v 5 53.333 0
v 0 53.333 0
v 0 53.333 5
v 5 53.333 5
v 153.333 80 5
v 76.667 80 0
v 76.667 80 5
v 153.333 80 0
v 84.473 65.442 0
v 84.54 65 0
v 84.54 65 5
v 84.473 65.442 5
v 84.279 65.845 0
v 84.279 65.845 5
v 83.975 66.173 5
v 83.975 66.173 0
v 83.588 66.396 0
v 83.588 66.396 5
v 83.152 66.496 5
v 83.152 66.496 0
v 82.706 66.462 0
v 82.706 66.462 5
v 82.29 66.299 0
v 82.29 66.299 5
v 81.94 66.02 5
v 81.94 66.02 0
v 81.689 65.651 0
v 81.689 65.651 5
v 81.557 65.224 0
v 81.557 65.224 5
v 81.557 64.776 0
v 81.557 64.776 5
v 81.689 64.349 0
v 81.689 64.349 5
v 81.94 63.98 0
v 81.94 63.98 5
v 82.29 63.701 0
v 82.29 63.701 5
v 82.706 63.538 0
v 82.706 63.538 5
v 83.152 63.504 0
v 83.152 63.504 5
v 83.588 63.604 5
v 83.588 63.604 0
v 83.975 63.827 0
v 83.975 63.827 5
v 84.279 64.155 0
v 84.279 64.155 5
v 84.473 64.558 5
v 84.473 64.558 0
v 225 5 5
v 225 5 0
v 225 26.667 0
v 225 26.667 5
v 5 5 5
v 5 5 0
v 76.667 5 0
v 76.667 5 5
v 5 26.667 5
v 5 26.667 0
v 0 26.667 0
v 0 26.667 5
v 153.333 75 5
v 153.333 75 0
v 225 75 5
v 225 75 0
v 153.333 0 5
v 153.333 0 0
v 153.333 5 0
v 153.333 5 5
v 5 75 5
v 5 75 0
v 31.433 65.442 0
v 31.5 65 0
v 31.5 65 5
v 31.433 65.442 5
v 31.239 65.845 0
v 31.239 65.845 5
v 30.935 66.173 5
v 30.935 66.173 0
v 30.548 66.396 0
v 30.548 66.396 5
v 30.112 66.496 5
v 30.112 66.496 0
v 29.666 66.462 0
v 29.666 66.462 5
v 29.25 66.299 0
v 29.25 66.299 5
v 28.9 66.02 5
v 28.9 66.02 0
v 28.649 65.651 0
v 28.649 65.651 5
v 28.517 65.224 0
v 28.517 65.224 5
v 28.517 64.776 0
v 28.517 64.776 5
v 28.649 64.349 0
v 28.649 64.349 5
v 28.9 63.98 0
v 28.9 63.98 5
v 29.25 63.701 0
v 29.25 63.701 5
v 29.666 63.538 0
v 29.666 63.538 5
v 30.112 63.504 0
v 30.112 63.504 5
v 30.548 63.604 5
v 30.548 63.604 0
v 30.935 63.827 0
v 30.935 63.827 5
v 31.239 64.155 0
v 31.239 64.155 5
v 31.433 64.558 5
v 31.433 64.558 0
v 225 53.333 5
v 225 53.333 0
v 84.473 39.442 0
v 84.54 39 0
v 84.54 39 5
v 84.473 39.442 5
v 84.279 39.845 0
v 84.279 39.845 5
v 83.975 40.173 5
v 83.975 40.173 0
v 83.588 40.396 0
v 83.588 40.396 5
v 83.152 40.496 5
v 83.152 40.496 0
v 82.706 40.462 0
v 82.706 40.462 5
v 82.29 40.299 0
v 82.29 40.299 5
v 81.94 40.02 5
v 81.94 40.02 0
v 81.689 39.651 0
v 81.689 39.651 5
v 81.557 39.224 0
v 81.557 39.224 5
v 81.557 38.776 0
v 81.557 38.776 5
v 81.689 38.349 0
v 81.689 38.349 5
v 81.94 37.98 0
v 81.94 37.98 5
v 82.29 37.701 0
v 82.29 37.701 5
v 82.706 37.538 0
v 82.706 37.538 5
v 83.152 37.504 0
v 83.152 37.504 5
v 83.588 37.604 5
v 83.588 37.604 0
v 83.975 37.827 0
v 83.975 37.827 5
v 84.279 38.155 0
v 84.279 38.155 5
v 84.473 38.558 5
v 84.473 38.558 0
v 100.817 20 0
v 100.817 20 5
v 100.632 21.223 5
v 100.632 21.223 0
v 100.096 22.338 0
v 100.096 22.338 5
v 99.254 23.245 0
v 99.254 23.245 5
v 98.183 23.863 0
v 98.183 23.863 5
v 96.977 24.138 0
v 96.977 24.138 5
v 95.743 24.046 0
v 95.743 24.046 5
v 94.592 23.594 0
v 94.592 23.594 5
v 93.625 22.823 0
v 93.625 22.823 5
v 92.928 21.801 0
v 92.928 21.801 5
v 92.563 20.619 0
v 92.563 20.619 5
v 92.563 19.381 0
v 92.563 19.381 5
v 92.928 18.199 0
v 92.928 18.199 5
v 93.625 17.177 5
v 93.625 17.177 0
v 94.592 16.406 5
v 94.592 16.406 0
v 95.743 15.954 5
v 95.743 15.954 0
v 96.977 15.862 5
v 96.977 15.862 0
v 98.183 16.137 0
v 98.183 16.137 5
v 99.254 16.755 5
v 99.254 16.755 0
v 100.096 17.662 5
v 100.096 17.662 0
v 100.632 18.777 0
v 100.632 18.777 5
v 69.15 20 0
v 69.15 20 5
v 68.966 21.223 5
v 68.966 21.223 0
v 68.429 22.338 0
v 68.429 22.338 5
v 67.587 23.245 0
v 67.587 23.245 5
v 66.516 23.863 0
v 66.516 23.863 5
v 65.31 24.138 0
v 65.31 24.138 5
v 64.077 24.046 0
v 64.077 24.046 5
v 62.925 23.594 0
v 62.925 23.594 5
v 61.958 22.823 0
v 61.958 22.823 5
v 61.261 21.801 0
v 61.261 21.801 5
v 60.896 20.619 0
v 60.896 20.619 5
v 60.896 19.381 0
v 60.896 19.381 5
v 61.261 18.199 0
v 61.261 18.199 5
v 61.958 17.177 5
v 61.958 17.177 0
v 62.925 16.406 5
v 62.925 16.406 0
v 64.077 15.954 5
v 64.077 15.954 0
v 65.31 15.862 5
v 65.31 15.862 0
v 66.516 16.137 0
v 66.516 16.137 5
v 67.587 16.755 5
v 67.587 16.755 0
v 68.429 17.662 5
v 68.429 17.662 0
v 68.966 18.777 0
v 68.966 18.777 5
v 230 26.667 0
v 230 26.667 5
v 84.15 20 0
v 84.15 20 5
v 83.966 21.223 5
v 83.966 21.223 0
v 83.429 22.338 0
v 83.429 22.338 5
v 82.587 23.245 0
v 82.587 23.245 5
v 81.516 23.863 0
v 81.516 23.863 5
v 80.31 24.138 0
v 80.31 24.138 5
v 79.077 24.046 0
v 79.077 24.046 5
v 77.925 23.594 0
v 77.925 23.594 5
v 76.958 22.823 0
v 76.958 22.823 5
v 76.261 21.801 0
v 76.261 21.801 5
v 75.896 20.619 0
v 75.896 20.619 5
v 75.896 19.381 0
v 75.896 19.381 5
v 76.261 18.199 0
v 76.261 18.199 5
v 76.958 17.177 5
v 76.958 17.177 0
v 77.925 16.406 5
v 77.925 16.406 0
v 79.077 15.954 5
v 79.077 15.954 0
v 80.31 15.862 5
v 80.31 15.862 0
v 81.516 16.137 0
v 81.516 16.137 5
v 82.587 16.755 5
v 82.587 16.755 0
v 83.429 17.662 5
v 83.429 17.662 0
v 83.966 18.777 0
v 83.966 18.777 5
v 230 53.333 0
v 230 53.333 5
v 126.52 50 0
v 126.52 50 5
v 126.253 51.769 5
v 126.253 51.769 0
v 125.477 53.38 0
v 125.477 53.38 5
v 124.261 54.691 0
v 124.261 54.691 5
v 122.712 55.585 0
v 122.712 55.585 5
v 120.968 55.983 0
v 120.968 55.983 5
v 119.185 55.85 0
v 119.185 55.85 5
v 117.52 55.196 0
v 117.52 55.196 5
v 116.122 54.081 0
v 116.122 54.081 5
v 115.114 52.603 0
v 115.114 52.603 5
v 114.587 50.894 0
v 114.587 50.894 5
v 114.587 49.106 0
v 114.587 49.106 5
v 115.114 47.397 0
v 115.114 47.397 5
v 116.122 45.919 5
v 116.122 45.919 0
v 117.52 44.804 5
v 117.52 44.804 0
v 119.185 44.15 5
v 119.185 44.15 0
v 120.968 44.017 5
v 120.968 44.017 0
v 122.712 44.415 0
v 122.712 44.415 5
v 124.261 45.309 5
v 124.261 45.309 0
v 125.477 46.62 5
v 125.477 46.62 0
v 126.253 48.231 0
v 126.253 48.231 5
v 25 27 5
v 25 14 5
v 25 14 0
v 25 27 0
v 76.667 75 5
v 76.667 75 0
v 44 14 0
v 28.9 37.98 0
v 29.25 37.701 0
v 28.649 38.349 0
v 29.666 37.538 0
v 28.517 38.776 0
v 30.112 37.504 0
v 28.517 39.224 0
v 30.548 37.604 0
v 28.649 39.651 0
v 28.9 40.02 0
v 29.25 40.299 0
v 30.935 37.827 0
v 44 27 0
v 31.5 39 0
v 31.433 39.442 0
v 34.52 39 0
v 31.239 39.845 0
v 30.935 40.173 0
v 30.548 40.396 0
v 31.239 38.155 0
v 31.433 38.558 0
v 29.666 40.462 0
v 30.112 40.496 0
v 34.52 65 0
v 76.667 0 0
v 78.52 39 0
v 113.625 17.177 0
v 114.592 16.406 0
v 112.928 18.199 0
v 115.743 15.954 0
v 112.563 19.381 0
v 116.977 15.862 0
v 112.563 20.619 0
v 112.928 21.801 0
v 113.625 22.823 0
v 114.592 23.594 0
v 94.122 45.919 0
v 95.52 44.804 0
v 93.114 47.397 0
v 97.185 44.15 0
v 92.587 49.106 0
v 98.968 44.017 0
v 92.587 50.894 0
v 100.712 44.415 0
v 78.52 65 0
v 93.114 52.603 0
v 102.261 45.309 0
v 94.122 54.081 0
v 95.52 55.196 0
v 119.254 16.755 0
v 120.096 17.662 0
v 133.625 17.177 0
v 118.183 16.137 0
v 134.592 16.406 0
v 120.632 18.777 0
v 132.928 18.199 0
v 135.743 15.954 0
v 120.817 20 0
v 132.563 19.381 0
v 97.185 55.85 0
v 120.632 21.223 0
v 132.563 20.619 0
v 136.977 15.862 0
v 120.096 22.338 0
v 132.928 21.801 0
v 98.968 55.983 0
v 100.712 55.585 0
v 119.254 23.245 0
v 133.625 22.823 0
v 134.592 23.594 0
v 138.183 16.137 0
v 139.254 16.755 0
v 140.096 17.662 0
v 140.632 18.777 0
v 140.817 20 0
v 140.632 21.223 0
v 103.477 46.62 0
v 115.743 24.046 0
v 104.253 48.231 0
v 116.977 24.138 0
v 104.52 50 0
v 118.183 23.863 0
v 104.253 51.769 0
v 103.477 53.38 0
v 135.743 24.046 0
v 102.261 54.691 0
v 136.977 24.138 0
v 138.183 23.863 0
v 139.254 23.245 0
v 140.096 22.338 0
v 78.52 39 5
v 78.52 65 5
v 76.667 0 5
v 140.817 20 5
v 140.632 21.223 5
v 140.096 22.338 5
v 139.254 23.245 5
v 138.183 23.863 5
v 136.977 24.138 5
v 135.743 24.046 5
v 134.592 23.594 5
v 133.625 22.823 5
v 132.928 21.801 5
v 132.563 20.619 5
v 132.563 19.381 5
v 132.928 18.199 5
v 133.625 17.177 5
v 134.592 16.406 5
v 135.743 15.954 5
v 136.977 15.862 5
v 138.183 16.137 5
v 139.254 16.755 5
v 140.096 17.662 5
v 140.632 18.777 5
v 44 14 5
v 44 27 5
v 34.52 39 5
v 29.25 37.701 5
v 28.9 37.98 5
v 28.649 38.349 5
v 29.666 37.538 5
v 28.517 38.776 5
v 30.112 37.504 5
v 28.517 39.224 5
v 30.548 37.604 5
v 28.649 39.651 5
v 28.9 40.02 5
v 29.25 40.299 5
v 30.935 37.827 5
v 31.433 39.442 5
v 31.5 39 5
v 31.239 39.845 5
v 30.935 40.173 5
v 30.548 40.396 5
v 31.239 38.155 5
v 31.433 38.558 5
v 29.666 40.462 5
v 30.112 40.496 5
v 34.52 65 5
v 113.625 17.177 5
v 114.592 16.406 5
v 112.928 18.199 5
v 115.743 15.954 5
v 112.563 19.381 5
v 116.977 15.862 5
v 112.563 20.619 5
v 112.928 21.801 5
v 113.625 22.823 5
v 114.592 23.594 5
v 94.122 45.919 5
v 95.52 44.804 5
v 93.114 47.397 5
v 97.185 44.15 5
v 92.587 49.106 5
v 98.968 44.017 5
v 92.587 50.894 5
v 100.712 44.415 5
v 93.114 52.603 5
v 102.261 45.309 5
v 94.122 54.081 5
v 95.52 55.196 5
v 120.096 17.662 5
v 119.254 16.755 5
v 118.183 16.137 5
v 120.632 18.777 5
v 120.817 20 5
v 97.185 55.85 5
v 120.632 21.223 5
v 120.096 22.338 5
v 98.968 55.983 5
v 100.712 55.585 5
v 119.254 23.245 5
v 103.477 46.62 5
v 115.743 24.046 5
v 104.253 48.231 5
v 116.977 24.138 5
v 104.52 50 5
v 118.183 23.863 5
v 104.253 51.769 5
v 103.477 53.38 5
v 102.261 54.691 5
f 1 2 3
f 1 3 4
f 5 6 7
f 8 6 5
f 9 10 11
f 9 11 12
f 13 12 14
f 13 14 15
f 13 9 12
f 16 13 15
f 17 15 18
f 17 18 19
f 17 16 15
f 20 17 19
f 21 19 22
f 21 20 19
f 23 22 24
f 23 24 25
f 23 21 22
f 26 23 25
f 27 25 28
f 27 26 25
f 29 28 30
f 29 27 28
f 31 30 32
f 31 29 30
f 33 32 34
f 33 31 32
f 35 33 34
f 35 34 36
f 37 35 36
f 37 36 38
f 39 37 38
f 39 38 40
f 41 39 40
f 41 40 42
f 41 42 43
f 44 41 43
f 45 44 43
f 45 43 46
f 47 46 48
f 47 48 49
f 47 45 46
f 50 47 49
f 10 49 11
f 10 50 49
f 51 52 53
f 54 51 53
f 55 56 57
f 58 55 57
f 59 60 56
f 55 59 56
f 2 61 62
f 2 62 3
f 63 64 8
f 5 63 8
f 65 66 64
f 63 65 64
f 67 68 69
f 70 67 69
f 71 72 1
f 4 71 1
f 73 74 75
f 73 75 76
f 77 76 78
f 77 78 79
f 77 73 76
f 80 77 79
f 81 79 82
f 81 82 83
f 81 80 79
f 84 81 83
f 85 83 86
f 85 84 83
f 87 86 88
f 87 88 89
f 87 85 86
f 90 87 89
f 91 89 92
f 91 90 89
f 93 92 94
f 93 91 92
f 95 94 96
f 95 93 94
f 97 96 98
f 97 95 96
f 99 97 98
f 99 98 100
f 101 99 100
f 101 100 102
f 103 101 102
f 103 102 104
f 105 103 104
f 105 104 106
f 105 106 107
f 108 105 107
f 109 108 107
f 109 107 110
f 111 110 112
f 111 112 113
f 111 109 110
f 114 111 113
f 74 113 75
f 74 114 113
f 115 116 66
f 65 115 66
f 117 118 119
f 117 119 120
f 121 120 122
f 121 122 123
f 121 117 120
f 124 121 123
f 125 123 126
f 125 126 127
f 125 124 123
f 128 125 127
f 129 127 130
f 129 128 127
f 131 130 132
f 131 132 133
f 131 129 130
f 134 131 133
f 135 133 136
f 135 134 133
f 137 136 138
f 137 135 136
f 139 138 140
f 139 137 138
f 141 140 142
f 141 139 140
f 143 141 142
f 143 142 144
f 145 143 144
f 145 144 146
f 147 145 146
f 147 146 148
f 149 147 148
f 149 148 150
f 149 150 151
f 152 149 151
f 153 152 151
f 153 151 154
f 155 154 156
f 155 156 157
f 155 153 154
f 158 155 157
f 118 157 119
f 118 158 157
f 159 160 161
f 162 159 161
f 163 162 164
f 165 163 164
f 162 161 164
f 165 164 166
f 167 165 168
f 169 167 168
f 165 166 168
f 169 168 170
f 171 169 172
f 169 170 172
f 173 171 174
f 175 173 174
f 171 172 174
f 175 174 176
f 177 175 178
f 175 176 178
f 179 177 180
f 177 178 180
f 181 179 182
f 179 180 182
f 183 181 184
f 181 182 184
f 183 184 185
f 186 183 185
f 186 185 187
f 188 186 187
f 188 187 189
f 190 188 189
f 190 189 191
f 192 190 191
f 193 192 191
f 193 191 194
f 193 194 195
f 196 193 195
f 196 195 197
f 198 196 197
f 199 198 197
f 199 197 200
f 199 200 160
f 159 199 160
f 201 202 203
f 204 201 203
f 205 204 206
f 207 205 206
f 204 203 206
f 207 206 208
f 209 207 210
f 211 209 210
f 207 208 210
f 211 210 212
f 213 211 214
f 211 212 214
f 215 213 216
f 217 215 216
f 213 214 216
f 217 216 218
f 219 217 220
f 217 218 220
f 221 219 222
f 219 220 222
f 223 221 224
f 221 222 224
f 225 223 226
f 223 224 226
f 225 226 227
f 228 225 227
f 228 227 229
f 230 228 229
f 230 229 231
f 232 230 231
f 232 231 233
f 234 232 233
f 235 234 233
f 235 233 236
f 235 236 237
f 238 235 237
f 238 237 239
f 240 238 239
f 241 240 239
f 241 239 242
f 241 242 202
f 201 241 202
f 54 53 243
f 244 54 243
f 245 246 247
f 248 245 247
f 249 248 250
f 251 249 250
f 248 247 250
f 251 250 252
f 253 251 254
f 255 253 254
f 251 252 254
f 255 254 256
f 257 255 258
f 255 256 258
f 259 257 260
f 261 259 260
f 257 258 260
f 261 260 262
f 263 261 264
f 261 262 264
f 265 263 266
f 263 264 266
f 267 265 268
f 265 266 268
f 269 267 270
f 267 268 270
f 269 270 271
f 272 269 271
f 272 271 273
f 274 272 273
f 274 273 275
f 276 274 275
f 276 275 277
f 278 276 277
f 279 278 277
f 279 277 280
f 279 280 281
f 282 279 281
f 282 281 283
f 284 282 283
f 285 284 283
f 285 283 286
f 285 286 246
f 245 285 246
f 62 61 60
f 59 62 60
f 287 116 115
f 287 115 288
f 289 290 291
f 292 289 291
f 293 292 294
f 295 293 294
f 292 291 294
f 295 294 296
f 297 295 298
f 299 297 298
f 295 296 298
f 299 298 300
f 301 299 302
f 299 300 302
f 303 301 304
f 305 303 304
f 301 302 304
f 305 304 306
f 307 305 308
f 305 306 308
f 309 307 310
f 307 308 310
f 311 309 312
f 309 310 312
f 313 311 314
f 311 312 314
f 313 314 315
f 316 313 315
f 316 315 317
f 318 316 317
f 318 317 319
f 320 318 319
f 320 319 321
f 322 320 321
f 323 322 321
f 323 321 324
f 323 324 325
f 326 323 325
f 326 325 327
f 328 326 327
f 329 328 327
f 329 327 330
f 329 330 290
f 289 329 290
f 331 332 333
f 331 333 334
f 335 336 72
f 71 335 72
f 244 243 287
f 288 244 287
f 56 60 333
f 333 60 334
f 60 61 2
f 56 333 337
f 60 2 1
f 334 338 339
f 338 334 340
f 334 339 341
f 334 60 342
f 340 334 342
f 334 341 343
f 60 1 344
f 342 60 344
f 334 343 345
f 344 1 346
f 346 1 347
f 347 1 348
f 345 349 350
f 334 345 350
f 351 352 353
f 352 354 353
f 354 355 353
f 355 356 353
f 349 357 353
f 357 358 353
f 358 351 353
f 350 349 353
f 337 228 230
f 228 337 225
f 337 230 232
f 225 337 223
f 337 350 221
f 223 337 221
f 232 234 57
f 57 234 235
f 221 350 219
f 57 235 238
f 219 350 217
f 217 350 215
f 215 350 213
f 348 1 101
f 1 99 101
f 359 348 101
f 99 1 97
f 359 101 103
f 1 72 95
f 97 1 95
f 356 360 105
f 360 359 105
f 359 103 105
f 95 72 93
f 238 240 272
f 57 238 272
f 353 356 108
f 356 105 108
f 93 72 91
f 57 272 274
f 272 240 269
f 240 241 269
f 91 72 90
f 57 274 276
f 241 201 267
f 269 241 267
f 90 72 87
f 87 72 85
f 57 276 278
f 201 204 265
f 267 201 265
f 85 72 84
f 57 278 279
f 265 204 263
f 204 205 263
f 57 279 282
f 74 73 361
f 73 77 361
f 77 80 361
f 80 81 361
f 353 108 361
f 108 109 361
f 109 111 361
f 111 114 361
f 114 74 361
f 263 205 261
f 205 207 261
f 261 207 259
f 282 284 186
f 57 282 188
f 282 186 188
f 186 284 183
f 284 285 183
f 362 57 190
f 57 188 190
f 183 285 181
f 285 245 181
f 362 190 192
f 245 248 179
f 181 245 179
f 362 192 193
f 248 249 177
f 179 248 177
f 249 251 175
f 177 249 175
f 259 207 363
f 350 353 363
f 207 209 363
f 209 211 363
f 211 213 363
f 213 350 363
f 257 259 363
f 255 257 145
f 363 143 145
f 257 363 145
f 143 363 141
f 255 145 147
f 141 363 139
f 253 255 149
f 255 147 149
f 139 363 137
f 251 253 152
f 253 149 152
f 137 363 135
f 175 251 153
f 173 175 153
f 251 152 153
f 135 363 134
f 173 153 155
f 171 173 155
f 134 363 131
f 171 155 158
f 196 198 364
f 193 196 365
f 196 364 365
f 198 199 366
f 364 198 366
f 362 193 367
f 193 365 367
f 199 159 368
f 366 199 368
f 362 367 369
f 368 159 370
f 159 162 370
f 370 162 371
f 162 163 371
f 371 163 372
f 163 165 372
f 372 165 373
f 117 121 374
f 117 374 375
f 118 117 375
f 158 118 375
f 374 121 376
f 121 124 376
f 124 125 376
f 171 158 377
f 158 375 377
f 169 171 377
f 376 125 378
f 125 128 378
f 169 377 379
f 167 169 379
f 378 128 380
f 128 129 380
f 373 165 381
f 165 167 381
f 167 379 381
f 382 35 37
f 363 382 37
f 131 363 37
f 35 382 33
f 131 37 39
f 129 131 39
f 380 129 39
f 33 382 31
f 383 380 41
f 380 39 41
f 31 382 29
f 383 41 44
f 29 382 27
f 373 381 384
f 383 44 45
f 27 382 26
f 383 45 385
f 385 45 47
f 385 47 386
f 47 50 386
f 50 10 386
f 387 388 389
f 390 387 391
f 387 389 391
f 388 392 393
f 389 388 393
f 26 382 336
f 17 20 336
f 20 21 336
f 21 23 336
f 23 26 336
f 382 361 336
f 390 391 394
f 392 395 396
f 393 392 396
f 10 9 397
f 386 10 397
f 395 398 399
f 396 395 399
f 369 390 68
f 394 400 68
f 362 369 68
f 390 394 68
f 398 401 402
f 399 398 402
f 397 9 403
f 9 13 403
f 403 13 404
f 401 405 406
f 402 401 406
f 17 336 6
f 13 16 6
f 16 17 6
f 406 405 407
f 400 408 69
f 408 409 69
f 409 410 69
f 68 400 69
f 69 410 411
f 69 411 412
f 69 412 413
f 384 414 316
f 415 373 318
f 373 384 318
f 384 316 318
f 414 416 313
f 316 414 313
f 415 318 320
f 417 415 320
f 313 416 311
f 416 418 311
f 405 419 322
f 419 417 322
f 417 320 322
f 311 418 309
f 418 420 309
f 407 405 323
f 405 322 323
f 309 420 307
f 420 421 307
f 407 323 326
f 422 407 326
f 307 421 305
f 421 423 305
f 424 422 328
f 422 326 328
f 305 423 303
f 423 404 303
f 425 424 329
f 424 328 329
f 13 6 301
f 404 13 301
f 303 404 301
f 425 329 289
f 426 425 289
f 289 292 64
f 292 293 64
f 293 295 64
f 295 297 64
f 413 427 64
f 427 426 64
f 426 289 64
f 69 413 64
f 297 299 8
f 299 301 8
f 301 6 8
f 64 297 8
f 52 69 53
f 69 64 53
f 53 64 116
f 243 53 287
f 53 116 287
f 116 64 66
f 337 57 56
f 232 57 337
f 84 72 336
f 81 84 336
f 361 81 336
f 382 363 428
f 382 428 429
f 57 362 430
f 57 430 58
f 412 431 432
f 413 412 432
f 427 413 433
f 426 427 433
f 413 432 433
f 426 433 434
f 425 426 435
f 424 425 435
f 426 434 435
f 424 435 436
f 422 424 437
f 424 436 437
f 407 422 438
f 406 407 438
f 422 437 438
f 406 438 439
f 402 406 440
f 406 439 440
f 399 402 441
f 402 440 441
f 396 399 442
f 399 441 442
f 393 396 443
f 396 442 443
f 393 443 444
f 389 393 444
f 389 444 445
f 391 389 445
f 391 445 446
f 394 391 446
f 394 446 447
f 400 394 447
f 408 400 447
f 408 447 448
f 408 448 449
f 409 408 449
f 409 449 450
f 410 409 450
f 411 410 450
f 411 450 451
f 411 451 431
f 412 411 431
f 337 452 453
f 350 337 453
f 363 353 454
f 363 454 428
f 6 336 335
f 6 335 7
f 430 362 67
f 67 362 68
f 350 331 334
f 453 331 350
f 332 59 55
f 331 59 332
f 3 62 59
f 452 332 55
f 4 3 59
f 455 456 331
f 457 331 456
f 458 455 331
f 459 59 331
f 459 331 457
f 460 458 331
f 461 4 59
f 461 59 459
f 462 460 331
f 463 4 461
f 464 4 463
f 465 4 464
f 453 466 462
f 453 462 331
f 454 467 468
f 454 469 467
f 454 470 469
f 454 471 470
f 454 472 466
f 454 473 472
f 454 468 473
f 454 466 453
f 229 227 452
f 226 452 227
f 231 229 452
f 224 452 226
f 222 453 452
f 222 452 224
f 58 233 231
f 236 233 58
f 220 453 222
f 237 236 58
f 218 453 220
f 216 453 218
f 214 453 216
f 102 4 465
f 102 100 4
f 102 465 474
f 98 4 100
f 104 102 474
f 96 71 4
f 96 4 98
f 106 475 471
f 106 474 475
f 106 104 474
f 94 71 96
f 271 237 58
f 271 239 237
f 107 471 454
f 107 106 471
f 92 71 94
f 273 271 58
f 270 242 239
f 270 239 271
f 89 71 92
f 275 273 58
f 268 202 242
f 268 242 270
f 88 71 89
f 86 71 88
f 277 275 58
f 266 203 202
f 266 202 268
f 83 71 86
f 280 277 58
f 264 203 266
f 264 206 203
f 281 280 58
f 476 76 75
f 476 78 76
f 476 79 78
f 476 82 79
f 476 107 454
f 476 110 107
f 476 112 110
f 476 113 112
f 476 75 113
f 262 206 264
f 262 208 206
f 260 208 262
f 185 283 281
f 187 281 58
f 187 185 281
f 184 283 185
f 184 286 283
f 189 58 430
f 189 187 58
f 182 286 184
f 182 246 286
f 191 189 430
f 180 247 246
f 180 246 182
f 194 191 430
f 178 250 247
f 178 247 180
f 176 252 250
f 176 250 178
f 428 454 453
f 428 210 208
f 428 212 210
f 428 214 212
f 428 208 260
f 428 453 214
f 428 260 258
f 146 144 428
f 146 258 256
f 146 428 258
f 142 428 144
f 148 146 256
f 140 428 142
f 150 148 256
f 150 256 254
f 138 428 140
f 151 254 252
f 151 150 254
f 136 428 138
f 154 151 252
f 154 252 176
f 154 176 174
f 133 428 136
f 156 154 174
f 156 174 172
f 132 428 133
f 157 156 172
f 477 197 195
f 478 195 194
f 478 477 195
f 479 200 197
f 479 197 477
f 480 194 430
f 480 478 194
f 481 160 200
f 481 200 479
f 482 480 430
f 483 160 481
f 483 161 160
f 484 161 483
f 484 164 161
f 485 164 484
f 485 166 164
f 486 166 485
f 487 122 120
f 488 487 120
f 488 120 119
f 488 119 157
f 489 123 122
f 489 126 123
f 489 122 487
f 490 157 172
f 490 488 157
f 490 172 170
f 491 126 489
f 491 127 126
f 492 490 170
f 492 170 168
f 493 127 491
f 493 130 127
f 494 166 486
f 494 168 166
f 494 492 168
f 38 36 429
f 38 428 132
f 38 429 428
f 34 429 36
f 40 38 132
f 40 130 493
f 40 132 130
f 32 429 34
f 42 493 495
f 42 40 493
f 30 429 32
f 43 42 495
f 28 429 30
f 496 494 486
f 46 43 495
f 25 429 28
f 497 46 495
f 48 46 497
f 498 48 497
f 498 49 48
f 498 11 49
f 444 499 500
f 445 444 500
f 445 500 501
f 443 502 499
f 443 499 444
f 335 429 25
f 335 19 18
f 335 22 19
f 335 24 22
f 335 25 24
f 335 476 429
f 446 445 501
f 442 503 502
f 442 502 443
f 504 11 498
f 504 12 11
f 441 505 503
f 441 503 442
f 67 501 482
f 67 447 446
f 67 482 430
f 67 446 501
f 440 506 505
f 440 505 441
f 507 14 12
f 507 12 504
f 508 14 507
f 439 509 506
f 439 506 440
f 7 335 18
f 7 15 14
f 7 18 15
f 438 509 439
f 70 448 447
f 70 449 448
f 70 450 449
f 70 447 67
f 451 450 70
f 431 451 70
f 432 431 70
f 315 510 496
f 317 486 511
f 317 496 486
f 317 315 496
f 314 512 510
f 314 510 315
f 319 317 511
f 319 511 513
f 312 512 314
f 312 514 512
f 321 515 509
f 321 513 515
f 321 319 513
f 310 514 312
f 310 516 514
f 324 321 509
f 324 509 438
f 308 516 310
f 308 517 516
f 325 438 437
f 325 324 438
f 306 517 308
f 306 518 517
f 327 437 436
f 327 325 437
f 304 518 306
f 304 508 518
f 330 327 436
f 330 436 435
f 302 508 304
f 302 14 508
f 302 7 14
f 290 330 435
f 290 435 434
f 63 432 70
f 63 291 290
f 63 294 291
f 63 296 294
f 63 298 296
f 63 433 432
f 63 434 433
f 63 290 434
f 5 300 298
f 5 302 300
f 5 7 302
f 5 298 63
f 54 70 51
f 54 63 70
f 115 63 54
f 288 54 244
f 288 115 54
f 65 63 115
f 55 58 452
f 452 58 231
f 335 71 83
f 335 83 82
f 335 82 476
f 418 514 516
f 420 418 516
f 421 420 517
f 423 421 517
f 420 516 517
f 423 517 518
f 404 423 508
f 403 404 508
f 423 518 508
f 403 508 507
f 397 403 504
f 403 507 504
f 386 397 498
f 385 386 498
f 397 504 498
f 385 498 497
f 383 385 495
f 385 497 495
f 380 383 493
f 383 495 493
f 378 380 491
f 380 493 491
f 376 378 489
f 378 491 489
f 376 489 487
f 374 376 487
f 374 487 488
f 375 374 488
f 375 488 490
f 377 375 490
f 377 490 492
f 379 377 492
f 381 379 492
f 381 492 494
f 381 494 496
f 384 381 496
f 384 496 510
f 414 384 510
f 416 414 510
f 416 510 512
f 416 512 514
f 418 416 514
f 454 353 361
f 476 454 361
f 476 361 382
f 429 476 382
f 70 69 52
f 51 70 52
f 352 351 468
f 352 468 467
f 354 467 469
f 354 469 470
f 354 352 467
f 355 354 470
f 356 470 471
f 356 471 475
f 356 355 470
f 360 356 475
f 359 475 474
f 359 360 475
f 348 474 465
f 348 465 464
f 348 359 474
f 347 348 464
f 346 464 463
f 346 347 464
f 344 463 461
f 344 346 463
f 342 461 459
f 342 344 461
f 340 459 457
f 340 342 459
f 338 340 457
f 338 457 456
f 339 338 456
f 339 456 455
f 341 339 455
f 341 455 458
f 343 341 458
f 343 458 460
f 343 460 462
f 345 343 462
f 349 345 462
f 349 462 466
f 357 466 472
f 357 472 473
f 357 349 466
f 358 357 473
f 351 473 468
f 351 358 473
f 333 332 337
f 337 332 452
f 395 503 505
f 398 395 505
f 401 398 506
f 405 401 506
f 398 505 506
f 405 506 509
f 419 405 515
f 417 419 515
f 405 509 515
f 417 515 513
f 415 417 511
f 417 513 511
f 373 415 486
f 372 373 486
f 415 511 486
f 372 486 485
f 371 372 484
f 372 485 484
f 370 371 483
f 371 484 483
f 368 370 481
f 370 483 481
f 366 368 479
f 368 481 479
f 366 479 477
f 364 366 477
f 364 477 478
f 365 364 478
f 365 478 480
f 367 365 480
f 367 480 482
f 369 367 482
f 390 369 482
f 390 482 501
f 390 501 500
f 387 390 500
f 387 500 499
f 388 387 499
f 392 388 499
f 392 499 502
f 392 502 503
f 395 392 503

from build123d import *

# Parameters (mm, degrees)
CROQUIS1_R              = 1.5
CROQUIS1_W              = 44
CROQUIS1_H              = 26
CROQUIS1_W_2            = 5
CROQUIS1_H_2            = 26.666666666
CROQUIS1_W_3            = 76.666666666
CROQUIS1_H_3            = 5
SALIENTE_EXTRUIR1_DEPTH = 5
CROQUIS2_R              = 4.15
CORTAR_EXTRUIR1_DEPTH   = 10
CROQUIS3_W              = 19
CROQUIS3_H              = 13
CORTAR_EXTRUIR2_DEPTH   = 10
CROQUIS4_R              = 4.15
CORTAR_EXTRUIR3_DEPTH   = 10
CROQUIS5_R              = 6
CORTAR_EXTRUIR4_DEPTH   = 10


with BuildPart() as part:
    # Croquis1 → Saliente-Extruir1 (new body)
    with BuildSketch(Plane.XY):
        Polygon((5, 26.666666667), (5, 5), (76.666666667, 5), (153.333333333, 5), (225, 5), (225, 26.666666667), (225, 53.333333333), (225, 75), (153.333333333, 75), (76.666666667, 75), (5, 75), (5, 53.333333333), align=None)
        with Locations((30, 39)):
            Circle(CROQUIS1_R, mode=Mode.SUBTRACT)
        with Locations((83.04, 39)):
            Circle(CROQUIS1_R, mode=Mode.SUBTRACT)
        with Locations((56.52, 52)):
            Rectangle(CROQUIS1_W, CROQUIS1_H, mode=Mode.SUBTRACT)
        with Locations((30, 65)):
            Circle(CROQUIS1_R, mode=Mode.SUBTRACT)
        with Locations((83.04, 65)):
            Circle(CROQUIS1_R, mode=Mode.SUBTRACT)
        with Locations((227.5, 40)):
            Rectangle(CROQUIS1_W_2, CROQUIS1_H_2)
        with Locations((115, 2.5)):
            Rectangle(CROQUIS1_W_3, CROQUIS1_H_3)
        with Locations((2.5, 40)):
            Rectangle(CROQUIS1_W_2, CROQUIS1_H_2)
        with Locations((115, 77.5)):
            Rectangle(CROQUIS1_W_3, CROQUIS1_H_3)
    extrude(amount=SALIENTE_EXTRUIR1_DEPTH)

    # Croquis2 → Cortar-Extruir1 (cut)
    with BuildSketch(Plane.XY.offset(5)):
        with Locations((96.666666667, 20)):
            Circle(CROQUIS2_R)
        with Locations((116.666666667, 20)):
            Circle(CROQUIS2_R)
        with Locations((136.666666667, 20)):
            Circle(CROQUIS2_R)
    extrude(amount=-CORTAR_EXTRUIR1_DEPTH, mode=Mode.SUBTRACT)

    # Croquis3 → Cortar-Extruir2 (cut)
    with BuildSketch(Plane.XY.offset(5)):
        with Locations((34.5, 20.5)):
            Rectangle(CROQUIS3_W, CROQUIS3_H)
    extrude(amount=-CORTAR_EXTRUIR2_DEPTH, mode=Mode.SUBTRACT)

    # Croquis4 → Cortar-Extruir3 (cut)
    with BuildSketch(Plane.XY.offset(5)):
        with Locations((65, 20)):
            Circle(CROQUIS4_R)
        with Locations((80, 20)):
            Circle(CROQUIS4_R)
    extrude(amount=-CORTAR_EXTRUIR3_DEPTH, mode=Mode.SUBTRACT)

    # Croquis5 → Cortar-Extruir4 (cut)
    with BuildSketch(Plane.XY.offset(5)):
        with Locations((98.52, 50)):
            Circle(CROQUIS5_R)
        with Locations((120.52, 50)):
            Circle(CROQUIS5_R)
    extrude(amount=-CORTAR_EXTRUIR4_DEPTH, mode=Mode.SUBTRACT)


solid = part.part
